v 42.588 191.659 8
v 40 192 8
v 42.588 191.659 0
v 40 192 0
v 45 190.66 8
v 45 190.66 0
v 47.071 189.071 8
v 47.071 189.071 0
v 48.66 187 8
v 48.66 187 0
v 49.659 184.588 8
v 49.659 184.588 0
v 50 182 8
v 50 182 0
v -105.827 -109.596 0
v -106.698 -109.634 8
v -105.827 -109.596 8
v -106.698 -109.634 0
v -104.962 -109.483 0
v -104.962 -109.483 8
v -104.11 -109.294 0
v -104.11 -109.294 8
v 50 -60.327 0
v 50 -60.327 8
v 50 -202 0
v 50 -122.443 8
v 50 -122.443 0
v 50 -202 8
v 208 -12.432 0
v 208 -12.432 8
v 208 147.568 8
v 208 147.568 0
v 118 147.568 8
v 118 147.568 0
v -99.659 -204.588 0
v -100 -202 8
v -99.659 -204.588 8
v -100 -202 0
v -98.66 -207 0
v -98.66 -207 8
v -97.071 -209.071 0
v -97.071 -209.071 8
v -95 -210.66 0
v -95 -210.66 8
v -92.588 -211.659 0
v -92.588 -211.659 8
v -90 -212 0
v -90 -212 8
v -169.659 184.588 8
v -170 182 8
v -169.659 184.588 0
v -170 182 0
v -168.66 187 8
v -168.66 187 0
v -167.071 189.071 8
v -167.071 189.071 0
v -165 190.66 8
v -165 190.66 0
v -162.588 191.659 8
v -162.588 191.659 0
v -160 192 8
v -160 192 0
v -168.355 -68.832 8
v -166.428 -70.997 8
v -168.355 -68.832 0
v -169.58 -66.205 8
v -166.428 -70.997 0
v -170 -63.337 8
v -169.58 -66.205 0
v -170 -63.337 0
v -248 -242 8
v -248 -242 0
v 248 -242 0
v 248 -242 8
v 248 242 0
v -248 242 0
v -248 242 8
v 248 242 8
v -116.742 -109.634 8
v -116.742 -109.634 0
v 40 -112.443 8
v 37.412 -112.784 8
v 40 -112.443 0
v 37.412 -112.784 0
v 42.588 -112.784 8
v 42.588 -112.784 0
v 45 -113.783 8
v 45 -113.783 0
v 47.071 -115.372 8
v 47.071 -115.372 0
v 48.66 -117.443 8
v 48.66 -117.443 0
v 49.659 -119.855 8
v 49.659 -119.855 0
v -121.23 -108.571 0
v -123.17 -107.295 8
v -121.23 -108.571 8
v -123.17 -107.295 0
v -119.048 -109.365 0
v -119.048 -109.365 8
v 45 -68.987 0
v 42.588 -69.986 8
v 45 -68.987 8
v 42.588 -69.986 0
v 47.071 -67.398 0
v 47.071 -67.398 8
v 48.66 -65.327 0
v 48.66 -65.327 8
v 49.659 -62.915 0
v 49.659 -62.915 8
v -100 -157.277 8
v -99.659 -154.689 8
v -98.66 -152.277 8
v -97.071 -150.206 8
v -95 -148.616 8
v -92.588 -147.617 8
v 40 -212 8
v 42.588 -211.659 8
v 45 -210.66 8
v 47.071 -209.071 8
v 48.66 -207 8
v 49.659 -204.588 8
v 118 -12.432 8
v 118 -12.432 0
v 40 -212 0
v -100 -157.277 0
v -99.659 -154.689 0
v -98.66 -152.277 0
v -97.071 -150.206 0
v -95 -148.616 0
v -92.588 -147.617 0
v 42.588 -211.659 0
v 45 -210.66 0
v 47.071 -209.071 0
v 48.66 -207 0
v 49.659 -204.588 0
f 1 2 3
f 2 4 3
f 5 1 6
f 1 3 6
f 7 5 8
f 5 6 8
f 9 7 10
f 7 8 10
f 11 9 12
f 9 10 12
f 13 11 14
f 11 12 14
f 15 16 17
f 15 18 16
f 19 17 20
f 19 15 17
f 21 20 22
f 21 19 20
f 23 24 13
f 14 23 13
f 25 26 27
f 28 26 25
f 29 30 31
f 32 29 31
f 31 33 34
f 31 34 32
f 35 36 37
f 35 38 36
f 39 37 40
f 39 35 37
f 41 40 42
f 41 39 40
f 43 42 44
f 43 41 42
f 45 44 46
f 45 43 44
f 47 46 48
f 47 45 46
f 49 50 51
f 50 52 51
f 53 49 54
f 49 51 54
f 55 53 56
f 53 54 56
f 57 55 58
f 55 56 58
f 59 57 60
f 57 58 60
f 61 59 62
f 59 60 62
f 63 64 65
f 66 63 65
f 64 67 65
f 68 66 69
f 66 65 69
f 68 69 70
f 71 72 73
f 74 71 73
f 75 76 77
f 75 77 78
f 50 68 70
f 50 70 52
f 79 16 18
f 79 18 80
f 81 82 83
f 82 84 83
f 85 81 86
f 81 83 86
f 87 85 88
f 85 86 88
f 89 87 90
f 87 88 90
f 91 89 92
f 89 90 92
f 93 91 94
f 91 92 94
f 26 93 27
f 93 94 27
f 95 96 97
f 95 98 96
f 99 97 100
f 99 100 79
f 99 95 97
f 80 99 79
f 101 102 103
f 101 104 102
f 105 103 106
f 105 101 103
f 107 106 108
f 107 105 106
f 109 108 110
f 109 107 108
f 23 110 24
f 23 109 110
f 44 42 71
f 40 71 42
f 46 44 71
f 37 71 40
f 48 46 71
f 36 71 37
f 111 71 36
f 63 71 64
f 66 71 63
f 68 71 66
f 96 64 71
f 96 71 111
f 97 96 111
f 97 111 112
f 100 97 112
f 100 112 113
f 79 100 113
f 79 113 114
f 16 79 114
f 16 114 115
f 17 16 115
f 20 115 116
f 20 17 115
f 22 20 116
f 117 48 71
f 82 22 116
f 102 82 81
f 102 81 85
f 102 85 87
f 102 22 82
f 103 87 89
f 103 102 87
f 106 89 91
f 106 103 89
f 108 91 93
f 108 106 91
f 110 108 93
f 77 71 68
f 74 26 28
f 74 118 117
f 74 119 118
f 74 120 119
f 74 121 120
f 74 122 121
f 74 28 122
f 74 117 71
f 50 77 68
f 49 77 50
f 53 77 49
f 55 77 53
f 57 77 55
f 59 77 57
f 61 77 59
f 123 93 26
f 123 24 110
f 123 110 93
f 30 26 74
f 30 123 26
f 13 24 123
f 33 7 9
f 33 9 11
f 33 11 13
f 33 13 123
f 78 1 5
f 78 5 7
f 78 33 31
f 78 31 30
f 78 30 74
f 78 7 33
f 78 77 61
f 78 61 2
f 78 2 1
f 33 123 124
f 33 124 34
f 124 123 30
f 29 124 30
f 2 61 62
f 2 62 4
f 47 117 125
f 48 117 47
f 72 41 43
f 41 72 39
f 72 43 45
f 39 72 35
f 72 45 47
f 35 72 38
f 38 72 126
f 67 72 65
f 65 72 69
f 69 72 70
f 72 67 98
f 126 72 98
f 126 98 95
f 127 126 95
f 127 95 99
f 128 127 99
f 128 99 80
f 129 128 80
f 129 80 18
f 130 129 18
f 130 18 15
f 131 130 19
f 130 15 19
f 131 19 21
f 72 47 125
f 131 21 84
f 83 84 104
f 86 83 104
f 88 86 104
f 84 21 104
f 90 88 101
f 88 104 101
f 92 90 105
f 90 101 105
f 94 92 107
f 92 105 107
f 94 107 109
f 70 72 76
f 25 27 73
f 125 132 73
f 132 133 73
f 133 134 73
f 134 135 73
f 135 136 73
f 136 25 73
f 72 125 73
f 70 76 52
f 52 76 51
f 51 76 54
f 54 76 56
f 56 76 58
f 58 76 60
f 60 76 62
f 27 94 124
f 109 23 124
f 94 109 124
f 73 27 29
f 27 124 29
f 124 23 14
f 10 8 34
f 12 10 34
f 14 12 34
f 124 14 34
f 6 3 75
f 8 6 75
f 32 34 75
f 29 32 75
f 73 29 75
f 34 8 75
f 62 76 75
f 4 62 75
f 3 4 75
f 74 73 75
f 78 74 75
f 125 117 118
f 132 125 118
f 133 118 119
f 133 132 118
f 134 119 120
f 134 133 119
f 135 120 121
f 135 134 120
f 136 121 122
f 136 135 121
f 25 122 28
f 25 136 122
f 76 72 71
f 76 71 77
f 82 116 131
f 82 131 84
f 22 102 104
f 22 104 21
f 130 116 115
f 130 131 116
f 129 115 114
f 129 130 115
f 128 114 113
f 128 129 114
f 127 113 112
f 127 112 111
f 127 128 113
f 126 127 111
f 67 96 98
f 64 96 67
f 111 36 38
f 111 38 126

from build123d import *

# Parameters (mm, degrees)
SKETCH1_W           = 496
SKETCH1_H           = 484
BOSS_EXTRUDE1_DEPTH = 8
SKETCH2_W           = 220
SKETCH2_H           = 260
CUT_EXTRUDE1_DEPTH  = 347.600634737
CUT_EXTRUDE2_DEPTH  = 347.600634737
FILLET1_R           = 10
FILLET2_R           = 10
CUT_EXTRUDE3_REACH  = 348.601
SKETCH4_W           = 90
SKETCH4_H           = 160


with BuildPart() as part:
    # Sketch1 → Boss-Extrude1 (new body)
    with BuildSketch(Plane.XY):
        Rectangle(SKETCH1_W, SKETCH1_H)
    extrude(amount=BOSS_EXTRUDE1_DEPTH)

    # Sketch2 → Cut-Extrude1 (cut, through all)
    with BuildSketch(Plane.XY.offset(8)):
        with Locations((-60, 62)):
            Rectangle(SKETCH2_W, SKETCH2_H)
        Polygon((-120.381967555, -109.634472725), (-170, -68), (50, -68), (-105.381967555, -109.634472725), align=None)
    extrude(amount=-CUT_EXTRUDE1_DEPTH, mode=Mode.SUBTRACT)

    # Sketch3 → Cut-Extrude2 (cut, through all)
    with BuildSketch(Plane.XY.offset(8)):
        Polygon((50, -109.411047216), (50, -212), (-100, -212), (-100, -149.603426081), align=None)
    extrude(amount=-CUT_EXTRUDE2_DEPTH, mode=Mode.SUBTRACT)

    # Fillet1
    fillet1_edges = [part.edges().sort_by_distance(p)[0] for p in [
        (50, -212, 4),
        (-100, -212, 4),
        (-100, -149.603426081, 4),
        (50, -109.411047216, 4),
    ]]
    fillet(fillet1_edges, radius=FILLET1_R)

    # Fillet2
    fillet2_edges = [part.edges().sort_by_distance(p)[0] for p in [
        (-170, -68, 4),
        (-170, 192, 4),
        (50, 192, 4),
        (50, -68, 4),
        (-105.381967555, -109.634472725, 4),
        (-120.381967555, -109.634472725, 4),
    ]]
    fillet(fillet2_edges, radius=FILLET2_R)

    # Sketch4 → Cut-Extrude3 (cut, up to next)
    with BuildSketch(Plane.XY.offset(8), mode=Mode.PRIVATE) as cut_extrude3_sk1:
        with Locations((163, 67.567761437)):
            Rectangle(SKETCH4_W, SKETCH4_H)
    cut_extrude3_tool1 = extrude(cut_extrude3_sk1.sketch, amount=-CUT_EXTRUDE3_REACH, mode=Mode.PRIVATE) & part.part
    add(cut_extrude3_tool1.solids().sort_by_distance((163, 67.567761, 8))[0], mode=Mode.SUBTRACT)


solid = part.part
